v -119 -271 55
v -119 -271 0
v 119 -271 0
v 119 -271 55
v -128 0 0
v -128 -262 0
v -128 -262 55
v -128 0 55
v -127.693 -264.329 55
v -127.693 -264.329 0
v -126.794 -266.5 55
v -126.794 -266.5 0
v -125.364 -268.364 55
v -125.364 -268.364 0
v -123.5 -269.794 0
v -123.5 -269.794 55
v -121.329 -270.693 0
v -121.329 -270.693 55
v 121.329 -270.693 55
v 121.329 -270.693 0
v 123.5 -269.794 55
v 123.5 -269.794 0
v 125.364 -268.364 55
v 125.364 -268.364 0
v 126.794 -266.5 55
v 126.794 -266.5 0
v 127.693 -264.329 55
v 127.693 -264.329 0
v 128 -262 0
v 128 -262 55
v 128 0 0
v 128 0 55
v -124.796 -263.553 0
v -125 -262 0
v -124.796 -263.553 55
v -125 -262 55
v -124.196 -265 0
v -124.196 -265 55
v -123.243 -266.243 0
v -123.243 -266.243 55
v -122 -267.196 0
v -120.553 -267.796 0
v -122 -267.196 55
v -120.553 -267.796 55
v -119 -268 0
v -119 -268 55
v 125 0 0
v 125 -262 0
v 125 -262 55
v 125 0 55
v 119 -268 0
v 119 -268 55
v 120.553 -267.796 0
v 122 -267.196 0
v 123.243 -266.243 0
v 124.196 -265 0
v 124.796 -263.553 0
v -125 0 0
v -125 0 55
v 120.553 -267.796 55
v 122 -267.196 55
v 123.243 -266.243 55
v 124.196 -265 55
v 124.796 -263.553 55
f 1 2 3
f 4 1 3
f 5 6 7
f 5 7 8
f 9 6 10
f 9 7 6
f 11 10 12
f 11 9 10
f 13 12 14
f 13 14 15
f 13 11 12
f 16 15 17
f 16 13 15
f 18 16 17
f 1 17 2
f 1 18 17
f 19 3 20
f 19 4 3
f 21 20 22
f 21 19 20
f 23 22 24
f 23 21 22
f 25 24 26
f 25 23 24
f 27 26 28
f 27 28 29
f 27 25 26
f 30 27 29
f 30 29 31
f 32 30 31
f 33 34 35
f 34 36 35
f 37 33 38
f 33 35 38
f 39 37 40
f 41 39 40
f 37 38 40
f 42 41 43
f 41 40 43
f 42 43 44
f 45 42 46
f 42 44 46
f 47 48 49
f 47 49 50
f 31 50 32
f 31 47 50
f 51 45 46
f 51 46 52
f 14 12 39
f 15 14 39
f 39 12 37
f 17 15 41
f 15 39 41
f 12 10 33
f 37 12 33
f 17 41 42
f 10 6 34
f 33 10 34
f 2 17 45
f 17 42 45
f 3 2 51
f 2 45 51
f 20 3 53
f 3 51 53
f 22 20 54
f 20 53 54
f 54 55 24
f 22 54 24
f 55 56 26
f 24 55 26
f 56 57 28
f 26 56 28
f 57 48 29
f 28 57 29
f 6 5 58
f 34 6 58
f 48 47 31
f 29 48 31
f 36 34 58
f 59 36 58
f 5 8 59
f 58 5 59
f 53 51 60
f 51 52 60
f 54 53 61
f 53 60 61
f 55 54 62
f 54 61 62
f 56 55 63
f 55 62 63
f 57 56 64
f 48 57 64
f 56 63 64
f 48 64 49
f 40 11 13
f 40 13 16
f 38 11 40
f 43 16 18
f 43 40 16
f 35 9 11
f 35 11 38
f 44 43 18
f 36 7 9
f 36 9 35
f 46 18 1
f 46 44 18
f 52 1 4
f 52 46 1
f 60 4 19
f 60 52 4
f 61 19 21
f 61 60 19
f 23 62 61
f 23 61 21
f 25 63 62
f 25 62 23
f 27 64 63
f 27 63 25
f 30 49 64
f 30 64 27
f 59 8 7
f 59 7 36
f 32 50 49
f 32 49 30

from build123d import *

# Parameters (mm, degrees)
SKETCH040_W    = 250
SKETCH040_H    = 268
PAD011_DEPTH   = 55
FILLET013_R    = 6
THICKNESS001_T = 3


with BuildPart() as part:
    # Sketch040 → Pad011 (new body)
    with BuildSketch(Plane.XY):
        with Locations((0, -134)):
            Rectangle(SKETCH040_W, SKETCH040_H)
    extrude(amount=PAD011_DEPTH)

    # Fillet013
    fillet013_edges = [part.edges().sort_by_distance(p)[0] for p in [
        (125, -268, 27.5),
        (-125, -268, 27.5),
    ]]
    fillet(fillet013_edges, radius=FILLET013_R)

    # Thickness001
    thickness001_openings = [part.faces().sort_by_distance(p)[0] for p in [
        (0, -133.969399, 55),
        (0, -133.969399, 0),
        (0, 0, 27.5),
    ]]
    offset(amount=THICKNESS001_T, openings=thickness001_openings)


solid = part.part
